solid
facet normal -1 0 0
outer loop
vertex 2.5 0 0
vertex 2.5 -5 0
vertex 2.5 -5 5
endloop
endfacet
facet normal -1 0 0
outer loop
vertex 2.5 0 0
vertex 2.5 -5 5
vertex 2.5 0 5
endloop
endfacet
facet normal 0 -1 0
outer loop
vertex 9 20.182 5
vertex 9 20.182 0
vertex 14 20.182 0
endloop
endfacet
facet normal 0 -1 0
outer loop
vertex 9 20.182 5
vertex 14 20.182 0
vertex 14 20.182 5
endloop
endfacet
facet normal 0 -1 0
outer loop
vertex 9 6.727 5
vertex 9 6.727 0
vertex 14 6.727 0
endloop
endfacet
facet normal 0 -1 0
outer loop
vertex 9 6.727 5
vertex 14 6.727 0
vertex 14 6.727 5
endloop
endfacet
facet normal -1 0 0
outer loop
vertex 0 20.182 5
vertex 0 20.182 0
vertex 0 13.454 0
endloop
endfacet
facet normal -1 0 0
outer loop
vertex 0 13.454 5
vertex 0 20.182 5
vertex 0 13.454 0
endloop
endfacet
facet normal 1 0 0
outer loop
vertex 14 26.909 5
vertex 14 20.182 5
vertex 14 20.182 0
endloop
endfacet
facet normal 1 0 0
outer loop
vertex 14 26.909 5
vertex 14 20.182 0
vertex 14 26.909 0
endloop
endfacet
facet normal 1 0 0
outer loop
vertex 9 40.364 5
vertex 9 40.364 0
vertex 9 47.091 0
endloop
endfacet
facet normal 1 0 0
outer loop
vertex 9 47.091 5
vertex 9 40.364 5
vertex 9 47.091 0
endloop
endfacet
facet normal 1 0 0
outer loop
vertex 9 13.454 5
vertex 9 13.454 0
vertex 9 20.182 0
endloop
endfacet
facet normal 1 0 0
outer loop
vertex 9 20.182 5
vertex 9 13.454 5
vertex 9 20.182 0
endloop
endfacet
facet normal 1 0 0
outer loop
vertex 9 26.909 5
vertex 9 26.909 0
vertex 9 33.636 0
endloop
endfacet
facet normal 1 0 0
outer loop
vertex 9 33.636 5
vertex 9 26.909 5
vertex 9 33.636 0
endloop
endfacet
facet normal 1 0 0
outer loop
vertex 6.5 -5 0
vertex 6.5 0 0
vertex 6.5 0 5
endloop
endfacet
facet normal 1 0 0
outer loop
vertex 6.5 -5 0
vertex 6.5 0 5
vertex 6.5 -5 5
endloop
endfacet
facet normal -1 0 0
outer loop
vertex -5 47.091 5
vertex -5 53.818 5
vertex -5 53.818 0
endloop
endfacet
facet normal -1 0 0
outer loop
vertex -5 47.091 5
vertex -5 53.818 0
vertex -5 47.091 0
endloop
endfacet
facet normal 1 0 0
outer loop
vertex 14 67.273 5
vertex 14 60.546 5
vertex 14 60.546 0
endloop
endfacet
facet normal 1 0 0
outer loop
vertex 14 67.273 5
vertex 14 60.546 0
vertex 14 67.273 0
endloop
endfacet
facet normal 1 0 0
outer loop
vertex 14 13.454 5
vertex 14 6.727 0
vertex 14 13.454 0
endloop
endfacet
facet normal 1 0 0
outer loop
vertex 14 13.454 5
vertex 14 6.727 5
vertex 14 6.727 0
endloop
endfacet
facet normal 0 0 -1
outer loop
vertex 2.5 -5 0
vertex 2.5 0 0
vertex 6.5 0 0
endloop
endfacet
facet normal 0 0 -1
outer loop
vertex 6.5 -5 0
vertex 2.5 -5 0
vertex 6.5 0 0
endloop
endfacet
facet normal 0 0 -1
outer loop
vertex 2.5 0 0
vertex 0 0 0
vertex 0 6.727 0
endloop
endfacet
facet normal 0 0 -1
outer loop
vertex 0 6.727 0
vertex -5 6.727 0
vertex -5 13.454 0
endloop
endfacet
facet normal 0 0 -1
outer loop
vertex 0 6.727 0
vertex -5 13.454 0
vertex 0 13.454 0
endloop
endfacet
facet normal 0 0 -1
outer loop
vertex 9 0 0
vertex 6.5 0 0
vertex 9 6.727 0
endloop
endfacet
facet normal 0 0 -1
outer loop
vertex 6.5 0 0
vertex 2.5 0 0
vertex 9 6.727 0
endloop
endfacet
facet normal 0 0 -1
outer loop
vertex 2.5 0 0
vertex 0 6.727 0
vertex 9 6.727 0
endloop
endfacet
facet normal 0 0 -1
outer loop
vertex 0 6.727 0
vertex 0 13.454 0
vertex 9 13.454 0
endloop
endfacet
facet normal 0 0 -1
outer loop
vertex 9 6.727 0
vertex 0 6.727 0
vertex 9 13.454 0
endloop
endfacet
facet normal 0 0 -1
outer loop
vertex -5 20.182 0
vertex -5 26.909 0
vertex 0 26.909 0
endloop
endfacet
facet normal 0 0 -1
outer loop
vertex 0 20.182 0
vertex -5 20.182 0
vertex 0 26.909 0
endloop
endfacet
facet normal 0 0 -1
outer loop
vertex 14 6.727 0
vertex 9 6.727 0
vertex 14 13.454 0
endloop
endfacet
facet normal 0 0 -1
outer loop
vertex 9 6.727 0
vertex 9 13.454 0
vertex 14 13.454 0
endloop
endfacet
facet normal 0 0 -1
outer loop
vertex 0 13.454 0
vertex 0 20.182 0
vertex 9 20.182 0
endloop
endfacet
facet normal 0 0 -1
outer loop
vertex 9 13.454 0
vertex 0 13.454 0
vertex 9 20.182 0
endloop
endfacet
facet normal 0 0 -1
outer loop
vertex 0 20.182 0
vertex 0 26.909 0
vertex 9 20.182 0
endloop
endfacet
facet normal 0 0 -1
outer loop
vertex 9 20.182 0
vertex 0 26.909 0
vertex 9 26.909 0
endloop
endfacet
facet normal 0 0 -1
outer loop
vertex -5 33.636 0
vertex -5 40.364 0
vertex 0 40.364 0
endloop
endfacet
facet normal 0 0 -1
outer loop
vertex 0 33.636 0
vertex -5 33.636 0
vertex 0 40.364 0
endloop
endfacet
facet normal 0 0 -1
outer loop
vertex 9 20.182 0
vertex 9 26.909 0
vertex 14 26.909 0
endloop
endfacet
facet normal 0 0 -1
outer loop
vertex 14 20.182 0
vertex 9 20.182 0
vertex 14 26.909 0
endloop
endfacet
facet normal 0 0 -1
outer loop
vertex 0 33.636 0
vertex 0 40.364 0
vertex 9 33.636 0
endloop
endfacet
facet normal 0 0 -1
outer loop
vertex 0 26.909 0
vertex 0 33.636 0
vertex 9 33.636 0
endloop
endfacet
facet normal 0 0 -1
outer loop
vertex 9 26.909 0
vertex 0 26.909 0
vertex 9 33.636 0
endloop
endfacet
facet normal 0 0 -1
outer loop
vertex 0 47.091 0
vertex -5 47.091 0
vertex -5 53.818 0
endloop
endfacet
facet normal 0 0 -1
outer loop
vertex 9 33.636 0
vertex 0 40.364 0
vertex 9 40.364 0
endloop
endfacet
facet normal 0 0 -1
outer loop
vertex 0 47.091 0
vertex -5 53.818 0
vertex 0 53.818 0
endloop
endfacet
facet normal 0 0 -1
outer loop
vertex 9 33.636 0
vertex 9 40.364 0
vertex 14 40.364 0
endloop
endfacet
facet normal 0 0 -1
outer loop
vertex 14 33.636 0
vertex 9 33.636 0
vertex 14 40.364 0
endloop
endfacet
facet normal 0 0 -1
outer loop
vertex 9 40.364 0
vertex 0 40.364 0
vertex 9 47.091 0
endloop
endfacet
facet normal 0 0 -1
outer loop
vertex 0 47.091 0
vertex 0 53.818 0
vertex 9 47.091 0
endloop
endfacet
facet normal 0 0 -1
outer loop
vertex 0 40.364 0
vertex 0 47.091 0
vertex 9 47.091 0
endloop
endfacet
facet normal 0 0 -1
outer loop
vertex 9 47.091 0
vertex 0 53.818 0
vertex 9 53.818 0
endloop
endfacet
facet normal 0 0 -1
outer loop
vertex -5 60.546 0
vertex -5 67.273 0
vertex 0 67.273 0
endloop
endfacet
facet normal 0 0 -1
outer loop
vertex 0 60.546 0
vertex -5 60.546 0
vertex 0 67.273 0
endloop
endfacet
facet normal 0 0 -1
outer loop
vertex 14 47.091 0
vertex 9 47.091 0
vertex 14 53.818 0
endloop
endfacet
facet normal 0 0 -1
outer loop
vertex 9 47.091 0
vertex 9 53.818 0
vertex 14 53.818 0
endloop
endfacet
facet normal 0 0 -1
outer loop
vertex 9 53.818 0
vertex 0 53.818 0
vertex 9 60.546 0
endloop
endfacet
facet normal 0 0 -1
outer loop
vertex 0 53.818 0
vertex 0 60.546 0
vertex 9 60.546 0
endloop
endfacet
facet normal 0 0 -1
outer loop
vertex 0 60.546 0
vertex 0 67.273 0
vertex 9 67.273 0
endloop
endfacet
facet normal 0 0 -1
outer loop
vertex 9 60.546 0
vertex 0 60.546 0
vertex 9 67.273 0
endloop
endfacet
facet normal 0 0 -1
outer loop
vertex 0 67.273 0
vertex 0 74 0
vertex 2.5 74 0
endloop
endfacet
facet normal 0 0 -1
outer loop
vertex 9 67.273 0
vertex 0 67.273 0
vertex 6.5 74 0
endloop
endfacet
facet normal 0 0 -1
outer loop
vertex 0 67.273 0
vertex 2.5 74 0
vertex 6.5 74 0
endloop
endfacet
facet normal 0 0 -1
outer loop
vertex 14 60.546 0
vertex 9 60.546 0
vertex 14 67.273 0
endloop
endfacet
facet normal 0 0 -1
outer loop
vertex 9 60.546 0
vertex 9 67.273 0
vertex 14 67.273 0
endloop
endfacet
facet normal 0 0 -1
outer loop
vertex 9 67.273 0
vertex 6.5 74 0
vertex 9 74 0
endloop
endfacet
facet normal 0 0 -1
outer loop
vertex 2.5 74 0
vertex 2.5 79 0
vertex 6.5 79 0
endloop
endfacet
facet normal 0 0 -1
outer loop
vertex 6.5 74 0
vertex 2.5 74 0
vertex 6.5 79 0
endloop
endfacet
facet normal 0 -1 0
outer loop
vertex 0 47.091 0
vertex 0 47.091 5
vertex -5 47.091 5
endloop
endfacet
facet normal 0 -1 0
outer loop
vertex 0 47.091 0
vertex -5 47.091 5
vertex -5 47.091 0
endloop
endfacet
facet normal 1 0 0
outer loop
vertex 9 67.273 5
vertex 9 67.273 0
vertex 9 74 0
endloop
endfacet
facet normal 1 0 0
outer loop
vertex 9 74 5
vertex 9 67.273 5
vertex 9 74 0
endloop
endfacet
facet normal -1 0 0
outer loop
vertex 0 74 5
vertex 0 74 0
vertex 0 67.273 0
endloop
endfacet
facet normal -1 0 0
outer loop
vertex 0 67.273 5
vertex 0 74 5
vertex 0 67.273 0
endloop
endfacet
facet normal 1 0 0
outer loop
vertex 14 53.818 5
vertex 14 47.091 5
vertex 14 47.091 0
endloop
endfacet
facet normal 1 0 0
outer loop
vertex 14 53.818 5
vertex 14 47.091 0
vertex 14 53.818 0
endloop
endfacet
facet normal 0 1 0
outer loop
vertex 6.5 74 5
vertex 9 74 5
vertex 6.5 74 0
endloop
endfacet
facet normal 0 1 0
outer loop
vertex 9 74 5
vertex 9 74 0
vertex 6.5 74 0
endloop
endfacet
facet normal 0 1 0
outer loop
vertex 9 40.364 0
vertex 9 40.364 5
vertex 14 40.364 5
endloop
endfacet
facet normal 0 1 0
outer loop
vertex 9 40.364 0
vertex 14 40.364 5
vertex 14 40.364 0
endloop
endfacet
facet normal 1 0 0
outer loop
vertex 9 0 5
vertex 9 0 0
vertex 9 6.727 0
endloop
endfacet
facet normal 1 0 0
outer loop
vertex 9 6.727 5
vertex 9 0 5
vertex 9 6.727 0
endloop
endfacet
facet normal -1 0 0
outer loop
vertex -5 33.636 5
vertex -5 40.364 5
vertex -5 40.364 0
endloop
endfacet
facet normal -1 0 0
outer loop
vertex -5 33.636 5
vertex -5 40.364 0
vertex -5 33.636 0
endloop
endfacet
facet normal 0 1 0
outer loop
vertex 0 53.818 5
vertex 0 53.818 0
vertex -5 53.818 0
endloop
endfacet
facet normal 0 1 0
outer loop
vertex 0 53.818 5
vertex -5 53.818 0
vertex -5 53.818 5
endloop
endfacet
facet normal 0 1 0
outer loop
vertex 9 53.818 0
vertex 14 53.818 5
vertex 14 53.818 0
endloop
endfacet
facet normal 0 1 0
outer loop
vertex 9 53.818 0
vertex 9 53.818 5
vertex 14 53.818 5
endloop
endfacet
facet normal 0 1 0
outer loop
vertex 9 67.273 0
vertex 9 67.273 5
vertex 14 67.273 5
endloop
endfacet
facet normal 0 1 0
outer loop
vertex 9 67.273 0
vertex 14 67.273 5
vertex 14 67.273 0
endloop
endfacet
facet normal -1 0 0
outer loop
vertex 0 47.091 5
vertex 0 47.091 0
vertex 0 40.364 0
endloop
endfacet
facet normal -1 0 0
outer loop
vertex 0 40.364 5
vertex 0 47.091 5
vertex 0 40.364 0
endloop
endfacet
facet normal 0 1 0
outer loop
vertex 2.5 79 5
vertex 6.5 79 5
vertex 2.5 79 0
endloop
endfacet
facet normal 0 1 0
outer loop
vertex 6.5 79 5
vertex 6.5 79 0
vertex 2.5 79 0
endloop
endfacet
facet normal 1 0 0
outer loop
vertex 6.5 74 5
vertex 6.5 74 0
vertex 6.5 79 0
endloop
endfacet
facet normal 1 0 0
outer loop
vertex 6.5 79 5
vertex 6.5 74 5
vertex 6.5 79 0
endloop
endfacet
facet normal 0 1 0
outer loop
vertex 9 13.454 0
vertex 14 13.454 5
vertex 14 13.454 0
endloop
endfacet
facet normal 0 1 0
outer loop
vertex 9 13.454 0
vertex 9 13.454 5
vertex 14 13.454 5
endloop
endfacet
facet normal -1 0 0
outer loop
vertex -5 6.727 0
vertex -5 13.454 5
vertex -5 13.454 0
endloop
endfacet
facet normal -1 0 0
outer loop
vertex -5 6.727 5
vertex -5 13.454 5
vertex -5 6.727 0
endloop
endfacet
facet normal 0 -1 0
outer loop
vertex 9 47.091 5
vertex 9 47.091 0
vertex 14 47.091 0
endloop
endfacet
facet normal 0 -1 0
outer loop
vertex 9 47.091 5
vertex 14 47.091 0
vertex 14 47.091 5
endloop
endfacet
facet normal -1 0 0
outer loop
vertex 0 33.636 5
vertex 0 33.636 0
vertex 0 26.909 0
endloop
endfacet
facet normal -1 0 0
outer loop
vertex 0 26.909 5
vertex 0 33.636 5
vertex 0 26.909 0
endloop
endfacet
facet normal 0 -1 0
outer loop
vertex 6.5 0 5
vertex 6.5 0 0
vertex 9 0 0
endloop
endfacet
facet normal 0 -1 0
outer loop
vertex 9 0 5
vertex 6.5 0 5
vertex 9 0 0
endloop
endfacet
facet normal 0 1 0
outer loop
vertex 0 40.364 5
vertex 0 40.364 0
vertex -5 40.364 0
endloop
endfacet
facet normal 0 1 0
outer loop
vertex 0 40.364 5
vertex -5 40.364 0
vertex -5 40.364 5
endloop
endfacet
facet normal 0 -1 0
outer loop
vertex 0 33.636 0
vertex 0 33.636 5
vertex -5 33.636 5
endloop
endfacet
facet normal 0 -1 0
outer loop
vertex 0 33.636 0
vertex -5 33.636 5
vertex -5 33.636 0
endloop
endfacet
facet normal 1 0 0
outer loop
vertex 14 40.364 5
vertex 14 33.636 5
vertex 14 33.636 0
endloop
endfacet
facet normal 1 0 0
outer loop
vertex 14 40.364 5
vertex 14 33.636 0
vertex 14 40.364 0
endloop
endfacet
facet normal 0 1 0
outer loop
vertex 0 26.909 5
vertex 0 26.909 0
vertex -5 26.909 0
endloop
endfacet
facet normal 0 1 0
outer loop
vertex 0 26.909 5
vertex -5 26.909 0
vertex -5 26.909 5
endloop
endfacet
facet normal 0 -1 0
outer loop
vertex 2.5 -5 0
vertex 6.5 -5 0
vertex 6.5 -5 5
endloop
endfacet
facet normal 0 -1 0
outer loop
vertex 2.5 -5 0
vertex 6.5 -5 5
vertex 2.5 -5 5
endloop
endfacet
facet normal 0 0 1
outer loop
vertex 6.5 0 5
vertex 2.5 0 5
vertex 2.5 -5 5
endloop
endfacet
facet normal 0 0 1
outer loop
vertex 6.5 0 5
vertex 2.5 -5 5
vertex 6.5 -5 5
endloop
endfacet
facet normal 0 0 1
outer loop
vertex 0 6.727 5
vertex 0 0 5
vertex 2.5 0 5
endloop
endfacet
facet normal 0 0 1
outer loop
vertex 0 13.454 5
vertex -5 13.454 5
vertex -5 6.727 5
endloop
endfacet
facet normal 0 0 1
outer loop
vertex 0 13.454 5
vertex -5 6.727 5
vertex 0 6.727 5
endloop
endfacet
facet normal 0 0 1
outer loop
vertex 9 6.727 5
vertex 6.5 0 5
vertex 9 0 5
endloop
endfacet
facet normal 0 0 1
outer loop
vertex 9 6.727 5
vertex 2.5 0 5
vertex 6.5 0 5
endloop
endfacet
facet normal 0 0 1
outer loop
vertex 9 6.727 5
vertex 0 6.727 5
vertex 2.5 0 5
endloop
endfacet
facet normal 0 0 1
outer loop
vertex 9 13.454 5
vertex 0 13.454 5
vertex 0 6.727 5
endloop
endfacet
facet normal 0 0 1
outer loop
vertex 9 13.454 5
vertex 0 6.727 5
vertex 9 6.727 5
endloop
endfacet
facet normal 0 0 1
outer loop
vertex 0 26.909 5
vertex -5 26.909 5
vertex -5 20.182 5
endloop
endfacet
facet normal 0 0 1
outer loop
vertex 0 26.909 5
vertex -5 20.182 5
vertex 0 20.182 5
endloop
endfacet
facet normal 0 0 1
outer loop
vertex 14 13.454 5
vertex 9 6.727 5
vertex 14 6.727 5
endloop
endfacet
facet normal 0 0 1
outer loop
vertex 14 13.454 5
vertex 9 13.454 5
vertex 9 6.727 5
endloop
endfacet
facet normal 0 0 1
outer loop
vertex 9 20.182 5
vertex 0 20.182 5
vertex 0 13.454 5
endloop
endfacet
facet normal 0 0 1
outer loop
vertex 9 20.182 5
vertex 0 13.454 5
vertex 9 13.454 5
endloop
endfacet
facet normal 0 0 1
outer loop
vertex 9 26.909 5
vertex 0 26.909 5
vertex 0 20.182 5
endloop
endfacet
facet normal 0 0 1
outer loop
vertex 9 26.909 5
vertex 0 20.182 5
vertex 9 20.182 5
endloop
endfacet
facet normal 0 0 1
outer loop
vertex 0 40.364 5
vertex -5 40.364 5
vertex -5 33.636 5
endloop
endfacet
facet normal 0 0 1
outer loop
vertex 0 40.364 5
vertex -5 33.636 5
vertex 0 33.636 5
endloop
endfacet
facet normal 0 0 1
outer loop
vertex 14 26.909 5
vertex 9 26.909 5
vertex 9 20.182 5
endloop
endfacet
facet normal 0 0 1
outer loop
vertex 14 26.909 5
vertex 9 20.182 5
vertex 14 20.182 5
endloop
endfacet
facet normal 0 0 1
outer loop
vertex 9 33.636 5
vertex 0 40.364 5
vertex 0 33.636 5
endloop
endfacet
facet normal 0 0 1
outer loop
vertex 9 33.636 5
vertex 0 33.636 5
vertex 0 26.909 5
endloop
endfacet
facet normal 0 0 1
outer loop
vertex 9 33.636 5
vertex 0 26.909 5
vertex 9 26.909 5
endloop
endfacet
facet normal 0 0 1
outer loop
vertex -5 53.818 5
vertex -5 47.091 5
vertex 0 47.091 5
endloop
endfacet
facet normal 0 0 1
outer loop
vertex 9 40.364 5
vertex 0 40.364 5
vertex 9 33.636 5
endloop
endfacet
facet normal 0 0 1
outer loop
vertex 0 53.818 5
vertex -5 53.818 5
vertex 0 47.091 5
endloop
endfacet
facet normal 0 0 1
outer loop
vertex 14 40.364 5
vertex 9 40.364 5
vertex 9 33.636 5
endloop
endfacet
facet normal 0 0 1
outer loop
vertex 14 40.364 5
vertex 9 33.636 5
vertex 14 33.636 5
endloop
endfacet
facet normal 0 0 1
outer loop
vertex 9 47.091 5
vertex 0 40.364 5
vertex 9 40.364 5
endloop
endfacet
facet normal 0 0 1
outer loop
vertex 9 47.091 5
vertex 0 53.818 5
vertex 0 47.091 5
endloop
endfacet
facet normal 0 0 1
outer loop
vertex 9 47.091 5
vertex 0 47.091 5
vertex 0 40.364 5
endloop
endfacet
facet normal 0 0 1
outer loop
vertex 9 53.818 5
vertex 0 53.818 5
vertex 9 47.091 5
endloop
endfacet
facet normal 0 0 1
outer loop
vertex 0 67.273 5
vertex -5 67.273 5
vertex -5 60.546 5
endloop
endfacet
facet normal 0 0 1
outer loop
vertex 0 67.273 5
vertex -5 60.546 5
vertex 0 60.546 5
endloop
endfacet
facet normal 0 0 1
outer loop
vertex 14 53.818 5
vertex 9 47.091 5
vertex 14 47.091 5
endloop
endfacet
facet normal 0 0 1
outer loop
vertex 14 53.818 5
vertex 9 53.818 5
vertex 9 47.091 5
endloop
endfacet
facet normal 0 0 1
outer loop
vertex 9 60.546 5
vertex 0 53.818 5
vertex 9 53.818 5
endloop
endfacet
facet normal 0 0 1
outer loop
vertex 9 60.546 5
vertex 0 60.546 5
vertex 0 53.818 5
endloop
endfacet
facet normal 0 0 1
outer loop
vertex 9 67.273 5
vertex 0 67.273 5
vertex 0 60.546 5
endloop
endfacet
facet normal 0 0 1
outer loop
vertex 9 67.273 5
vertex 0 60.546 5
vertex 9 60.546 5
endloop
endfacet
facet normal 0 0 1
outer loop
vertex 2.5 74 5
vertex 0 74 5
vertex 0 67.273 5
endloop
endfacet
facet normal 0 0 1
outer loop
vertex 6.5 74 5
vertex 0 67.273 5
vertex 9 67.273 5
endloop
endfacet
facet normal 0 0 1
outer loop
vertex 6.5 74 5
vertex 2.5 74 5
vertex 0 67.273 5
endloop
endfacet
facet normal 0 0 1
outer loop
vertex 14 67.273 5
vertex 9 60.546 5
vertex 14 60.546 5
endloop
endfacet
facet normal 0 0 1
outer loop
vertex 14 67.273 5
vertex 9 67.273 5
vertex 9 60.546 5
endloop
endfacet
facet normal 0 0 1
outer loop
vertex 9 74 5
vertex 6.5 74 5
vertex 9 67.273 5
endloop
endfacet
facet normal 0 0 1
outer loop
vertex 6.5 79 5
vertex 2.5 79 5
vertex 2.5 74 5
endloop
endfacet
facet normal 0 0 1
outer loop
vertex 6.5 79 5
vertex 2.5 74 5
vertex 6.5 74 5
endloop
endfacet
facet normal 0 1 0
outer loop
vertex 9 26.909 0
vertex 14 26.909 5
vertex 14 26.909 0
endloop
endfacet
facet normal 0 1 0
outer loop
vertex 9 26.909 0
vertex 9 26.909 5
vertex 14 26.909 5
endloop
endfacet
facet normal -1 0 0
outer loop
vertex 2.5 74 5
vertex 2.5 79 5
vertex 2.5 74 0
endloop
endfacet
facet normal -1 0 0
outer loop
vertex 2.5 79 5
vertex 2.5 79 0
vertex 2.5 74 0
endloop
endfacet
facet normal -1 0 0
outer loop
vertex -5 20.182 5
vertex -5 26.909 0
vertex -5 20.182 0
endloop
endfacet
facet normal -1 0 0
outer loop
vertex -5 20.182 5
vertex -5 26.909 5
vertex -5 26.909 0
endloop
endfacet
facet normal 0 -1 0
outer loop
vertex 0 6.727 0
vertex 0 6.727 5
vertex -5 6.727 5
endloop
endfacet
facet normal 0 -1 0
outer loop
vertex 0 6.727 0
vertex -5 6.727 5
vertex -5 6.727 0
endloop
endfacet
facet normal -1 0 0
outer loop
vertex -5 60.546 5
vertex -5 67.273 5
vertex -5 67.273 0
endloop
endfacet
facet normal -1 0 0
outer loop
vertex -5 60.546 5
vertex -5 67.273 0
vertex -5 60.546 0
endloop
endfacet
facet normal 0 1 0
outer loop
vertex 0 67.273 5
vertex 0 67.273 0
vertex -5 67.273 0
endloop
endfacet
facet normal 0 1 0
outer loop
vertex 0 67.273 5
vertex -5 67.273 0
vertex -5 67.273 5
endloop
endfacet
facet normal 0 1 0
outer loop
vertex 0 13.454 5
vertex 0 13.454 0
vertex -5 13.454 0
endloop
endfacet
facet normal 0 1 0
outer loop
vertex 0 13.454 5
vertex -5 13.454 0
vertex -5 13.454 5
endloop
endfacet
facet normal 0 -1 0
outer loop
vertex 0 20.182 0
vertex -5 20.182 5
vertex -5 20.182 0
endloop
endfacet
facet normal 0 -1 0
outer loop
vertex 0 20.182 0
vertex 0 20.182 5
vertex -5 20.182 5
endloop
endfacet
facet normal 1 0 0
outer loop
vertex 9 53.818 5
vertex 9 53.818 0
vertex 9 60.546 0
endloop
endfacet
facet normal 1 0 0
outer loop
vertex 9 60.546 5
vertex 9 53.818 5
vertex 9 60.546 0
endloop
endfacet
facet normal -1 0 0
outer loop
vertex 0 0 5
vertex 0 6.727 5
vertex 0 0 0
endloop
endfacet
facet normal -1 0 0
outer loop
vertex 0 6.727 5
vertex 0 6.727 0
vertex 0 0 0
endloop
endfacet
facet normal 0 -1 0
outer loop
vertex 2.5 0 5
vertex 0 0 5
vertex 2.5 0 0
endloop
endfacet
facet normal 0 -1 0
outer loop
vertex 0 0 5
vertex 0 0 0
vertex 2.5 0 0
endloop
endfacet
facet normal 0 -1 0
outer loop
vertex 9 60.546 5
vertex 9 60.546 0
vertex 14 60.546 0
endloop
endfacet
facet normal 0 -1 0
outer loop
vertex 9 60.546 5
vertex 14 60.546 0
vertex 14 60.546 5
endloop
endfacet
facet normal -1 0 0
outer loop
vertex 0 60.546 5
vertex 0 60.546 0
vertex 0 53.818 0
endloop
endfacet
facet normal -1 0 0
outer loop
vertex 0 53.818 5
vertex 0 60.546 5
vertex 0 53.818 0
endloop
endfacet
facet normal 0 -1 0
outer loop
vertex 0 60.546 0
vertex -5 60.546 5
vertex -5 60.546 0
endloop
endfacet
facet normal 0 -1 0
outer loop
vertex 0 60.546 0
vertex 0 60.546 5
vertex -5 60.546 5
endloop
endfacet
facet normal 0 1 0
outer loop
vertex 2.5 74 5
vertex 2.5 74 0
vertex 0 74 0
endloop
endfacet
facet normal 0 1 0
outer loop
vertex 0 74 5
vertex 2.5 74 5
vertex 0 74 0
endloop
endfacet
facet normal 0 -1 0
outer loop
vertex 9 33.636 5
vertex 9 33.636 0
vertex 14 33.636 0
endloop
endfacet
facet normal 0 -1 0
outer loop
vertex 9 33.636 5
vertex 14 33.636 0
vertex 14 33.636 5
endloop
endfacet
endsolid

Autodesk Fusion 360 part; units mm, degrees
sketch "Sketch1" plane through (0, 0, 0) normal (0, 0, 1) x (1, 0, 0)
  line L0 (0, 0) -> (9, 0)
  line L1 (9, 0) -> (9, 74)
  line L2 (9, 74) -> (0, 74)
  line L3 (0, 74) -> (0, 0)
  dimension "d5" = 9
  dimension "d6" = 74
extrude "Extrude1" add sketch "Sketch1" along normal blind 5
sketch "Sketch2" plane through (9, 0, 0) normal (1, 0, 0) x (0, 1, 0)
  line L0 (0, 0) -> (74, 0)
  line L1 (74, 0) -> (74, 5)
  line L2 (74, 5) -> (0, 5)
  line L3 (0, 5) -> (0, 0)
  line L4 (6.7273, 5) -> (13.4545, 5)
  line L5 (13.4545, 5) -> (13.4545, 0)
  line L6 (13.4545, 0) -> (6.7273, 0)
  line L7 (6.7273, 0) -> (6.7273, 5)
  line L8 (20.1818, 0) -> (20.1818, 5)
  line L9 (20.1818, 5) -> (26.9091, 5)
  line L10 (26.9091, 5) -> (26.9091, 0)
  line L11 (26.9091, 0) -> (20.1818, 0)
  line L12 (33.6364, 0) -> (33.6364, 5)
  line L13 (33.6364, 5) -> (40.3636, 5)
  line L14 (40.3636, 5) -> (40.3636, 0)
  line L15 (40.3636, 0) -> (33.6364, 0)
  line L16 (47.0909, 0) -> (47.0909, 5)
  line L17 (47.0909, 5) -> (53.8182, 5)
  line L18 (53.8182, 5) -> (53.8182, 0)
  line L19 (53.8182, 0) -> (47.0909, 0)
  line L20 (60.5455, 0) -> (60.5455, 5)
  line L21 (60.5455, 5) -> (67.2727, 5)
  line L22 (67.2727, 5) -> (67.2727, 0)
  line L23 (67.2727, 0) -> (60.5455, 0)
  dimension "d9" = 6.7273
  dimension "d10" = 6.7273
  dimension "d13" = 53.8182
  dimension "d14" = 0
extrude "Extrude2" add sketch "Sketch2" along normal blind 5 contours L0 L2 L4 L5 L6 L7 | L0 L2 L8 L9 L10 L11 | L0 L2 L12 L13 L14 L15 | L0 L2 L16 L17 L18 L19 | L0 L2 L20 L21 L22 L23
sketch "Sketch3" plane through (0, 0, 0) normal (-1, 0, 0) x (0, -1, 0)
  line L0 (-74, 0) -> (0, 0)
  line L1 (0, 0) -> (0, 5)
  line L2 (0, 5) -> (-74, 5)
  line L3 (-74, 5) -> (-74, 0)
  line L4 (-67.2727, 5) -> (-60.5455, 5)
  line L5 (-60.5455, 5) -> (-60.5455, 0)
  line L6 (-60.5455, 0) -> (-67.2727, 0)
  line L7 (-67.2727, 0) -> (-67.2727, 5)
  line L8 (-53.8182, 0) -> (-53.8182, 5)
  line L9 (-53.8182, 5) -> (-47.0909, 5)
  line L10 (-47.0909, 5) -> (-47.0909, 0)
  line L11 (-47.0909, 0) -> (-53.8182, 0)
  line L12 (-40.3636, 0) -> (-40.3636, 5)
  line L13 (-40.3636, 5) -> (-33.6364, 5)
  line L14 (-33.6364, 5) -> (-33.6364, 0)
  line L15 (-33.6364, 0) -> (-40.3636, 0)
  line L16 (-26.9091, 0) -> (-26.9091, 5)
  line L17 (-26.9091, 5) -> (-20.1818, 5)
  line L18 (-20.1818, 5) -> (-20.1818, 0)
  line L19 (-20.1818, 0) -> (-26.9091, 0)
  line L20 (-13.4545, 0) -> (-13.4545, 5)
  line L21 (-13.4545, 5) -> (-6.7273, 5)
  line L22 (-6.7273, 5) -> (-6.7273, 0)
  line L23 (-6.7273, 0) -> (-13.4545, 0)
  dimension "d17" = 6.7273
  dimension "d18" = 6.7273
  dimension "d21" = 53.8182
  dimension "d22" = 0
extrude "Extrude3" add sketch "Sketch3" along normal blind 5 contours L0 L2 L4 L5 L6 L7 | L0 L2 L8 L9 L10 L11 | L0 L2 L12 L13 L14 L15 | L0 L2 L16 L17 L18 L19 | L0 L2 L20 L21 L22 L23
sketch "Sketch4" plane through (0, 0, 0) normal (0, 0, 1) x (1, 0, 0)
  line L0 (2.5, 0) -> (6.5, 0)
  line L1 (6.5, 0) -> (6.5, -5)
  line L2 (6.5, -5) -> (2.5, -5)
  line L3 (2.5, -5) -> (2.5, 0)
  line L4 (0, 0) -> (9, 0)
  line L5 (6.5, 0) -> (9, 0) construction
  line L6 (0, 0) -> (2.5, 0) construction
  line L7 (2.5, 74) -> (6.5, 74)
  line L8 (6.5, 74) -> (6.5, 79)
  line L9 (6.5, 79) -> (2.5, 79)
  line L10 (2.5, 79) -> (2.5, 74)
  line L11 (9, 74) -> (0, 74)
  line L12 (6.5, 74) -> (9, 74) construction
  line L13 (2.5, 74) -> (0, 74) construction
  dimension "d25" = 5
  dimension "d26" = 4
  dimension "d27" = 4
  dimension "d28" = 5
extrude "Extrude4" add sketch "Sketch4" along normal blind 5
equation "laius = 74 mm"
equation "korgus = 9 mm"
equation "laius_tapp = laius / 11"
equation "paksus = 5 mm"
equation "d5 = korgus"
equation "d6 = laius"
equation "d7 = paksus"
equation "d9 = laius_tapp"
equation "d10 = laius_tapp"
equation "d13 = laius - 3 * laius_tapp"
equation "d15 = paksus"
equation "d17 = laius_tapp"
equation "d18 = laius_tapp"
equation "d21 = laius - 3 * laius_tapp"
equation "d23 = paksus"
equation "d25 = paksus"
equation "d28 = paksus"
equation "d29 = paksus"
